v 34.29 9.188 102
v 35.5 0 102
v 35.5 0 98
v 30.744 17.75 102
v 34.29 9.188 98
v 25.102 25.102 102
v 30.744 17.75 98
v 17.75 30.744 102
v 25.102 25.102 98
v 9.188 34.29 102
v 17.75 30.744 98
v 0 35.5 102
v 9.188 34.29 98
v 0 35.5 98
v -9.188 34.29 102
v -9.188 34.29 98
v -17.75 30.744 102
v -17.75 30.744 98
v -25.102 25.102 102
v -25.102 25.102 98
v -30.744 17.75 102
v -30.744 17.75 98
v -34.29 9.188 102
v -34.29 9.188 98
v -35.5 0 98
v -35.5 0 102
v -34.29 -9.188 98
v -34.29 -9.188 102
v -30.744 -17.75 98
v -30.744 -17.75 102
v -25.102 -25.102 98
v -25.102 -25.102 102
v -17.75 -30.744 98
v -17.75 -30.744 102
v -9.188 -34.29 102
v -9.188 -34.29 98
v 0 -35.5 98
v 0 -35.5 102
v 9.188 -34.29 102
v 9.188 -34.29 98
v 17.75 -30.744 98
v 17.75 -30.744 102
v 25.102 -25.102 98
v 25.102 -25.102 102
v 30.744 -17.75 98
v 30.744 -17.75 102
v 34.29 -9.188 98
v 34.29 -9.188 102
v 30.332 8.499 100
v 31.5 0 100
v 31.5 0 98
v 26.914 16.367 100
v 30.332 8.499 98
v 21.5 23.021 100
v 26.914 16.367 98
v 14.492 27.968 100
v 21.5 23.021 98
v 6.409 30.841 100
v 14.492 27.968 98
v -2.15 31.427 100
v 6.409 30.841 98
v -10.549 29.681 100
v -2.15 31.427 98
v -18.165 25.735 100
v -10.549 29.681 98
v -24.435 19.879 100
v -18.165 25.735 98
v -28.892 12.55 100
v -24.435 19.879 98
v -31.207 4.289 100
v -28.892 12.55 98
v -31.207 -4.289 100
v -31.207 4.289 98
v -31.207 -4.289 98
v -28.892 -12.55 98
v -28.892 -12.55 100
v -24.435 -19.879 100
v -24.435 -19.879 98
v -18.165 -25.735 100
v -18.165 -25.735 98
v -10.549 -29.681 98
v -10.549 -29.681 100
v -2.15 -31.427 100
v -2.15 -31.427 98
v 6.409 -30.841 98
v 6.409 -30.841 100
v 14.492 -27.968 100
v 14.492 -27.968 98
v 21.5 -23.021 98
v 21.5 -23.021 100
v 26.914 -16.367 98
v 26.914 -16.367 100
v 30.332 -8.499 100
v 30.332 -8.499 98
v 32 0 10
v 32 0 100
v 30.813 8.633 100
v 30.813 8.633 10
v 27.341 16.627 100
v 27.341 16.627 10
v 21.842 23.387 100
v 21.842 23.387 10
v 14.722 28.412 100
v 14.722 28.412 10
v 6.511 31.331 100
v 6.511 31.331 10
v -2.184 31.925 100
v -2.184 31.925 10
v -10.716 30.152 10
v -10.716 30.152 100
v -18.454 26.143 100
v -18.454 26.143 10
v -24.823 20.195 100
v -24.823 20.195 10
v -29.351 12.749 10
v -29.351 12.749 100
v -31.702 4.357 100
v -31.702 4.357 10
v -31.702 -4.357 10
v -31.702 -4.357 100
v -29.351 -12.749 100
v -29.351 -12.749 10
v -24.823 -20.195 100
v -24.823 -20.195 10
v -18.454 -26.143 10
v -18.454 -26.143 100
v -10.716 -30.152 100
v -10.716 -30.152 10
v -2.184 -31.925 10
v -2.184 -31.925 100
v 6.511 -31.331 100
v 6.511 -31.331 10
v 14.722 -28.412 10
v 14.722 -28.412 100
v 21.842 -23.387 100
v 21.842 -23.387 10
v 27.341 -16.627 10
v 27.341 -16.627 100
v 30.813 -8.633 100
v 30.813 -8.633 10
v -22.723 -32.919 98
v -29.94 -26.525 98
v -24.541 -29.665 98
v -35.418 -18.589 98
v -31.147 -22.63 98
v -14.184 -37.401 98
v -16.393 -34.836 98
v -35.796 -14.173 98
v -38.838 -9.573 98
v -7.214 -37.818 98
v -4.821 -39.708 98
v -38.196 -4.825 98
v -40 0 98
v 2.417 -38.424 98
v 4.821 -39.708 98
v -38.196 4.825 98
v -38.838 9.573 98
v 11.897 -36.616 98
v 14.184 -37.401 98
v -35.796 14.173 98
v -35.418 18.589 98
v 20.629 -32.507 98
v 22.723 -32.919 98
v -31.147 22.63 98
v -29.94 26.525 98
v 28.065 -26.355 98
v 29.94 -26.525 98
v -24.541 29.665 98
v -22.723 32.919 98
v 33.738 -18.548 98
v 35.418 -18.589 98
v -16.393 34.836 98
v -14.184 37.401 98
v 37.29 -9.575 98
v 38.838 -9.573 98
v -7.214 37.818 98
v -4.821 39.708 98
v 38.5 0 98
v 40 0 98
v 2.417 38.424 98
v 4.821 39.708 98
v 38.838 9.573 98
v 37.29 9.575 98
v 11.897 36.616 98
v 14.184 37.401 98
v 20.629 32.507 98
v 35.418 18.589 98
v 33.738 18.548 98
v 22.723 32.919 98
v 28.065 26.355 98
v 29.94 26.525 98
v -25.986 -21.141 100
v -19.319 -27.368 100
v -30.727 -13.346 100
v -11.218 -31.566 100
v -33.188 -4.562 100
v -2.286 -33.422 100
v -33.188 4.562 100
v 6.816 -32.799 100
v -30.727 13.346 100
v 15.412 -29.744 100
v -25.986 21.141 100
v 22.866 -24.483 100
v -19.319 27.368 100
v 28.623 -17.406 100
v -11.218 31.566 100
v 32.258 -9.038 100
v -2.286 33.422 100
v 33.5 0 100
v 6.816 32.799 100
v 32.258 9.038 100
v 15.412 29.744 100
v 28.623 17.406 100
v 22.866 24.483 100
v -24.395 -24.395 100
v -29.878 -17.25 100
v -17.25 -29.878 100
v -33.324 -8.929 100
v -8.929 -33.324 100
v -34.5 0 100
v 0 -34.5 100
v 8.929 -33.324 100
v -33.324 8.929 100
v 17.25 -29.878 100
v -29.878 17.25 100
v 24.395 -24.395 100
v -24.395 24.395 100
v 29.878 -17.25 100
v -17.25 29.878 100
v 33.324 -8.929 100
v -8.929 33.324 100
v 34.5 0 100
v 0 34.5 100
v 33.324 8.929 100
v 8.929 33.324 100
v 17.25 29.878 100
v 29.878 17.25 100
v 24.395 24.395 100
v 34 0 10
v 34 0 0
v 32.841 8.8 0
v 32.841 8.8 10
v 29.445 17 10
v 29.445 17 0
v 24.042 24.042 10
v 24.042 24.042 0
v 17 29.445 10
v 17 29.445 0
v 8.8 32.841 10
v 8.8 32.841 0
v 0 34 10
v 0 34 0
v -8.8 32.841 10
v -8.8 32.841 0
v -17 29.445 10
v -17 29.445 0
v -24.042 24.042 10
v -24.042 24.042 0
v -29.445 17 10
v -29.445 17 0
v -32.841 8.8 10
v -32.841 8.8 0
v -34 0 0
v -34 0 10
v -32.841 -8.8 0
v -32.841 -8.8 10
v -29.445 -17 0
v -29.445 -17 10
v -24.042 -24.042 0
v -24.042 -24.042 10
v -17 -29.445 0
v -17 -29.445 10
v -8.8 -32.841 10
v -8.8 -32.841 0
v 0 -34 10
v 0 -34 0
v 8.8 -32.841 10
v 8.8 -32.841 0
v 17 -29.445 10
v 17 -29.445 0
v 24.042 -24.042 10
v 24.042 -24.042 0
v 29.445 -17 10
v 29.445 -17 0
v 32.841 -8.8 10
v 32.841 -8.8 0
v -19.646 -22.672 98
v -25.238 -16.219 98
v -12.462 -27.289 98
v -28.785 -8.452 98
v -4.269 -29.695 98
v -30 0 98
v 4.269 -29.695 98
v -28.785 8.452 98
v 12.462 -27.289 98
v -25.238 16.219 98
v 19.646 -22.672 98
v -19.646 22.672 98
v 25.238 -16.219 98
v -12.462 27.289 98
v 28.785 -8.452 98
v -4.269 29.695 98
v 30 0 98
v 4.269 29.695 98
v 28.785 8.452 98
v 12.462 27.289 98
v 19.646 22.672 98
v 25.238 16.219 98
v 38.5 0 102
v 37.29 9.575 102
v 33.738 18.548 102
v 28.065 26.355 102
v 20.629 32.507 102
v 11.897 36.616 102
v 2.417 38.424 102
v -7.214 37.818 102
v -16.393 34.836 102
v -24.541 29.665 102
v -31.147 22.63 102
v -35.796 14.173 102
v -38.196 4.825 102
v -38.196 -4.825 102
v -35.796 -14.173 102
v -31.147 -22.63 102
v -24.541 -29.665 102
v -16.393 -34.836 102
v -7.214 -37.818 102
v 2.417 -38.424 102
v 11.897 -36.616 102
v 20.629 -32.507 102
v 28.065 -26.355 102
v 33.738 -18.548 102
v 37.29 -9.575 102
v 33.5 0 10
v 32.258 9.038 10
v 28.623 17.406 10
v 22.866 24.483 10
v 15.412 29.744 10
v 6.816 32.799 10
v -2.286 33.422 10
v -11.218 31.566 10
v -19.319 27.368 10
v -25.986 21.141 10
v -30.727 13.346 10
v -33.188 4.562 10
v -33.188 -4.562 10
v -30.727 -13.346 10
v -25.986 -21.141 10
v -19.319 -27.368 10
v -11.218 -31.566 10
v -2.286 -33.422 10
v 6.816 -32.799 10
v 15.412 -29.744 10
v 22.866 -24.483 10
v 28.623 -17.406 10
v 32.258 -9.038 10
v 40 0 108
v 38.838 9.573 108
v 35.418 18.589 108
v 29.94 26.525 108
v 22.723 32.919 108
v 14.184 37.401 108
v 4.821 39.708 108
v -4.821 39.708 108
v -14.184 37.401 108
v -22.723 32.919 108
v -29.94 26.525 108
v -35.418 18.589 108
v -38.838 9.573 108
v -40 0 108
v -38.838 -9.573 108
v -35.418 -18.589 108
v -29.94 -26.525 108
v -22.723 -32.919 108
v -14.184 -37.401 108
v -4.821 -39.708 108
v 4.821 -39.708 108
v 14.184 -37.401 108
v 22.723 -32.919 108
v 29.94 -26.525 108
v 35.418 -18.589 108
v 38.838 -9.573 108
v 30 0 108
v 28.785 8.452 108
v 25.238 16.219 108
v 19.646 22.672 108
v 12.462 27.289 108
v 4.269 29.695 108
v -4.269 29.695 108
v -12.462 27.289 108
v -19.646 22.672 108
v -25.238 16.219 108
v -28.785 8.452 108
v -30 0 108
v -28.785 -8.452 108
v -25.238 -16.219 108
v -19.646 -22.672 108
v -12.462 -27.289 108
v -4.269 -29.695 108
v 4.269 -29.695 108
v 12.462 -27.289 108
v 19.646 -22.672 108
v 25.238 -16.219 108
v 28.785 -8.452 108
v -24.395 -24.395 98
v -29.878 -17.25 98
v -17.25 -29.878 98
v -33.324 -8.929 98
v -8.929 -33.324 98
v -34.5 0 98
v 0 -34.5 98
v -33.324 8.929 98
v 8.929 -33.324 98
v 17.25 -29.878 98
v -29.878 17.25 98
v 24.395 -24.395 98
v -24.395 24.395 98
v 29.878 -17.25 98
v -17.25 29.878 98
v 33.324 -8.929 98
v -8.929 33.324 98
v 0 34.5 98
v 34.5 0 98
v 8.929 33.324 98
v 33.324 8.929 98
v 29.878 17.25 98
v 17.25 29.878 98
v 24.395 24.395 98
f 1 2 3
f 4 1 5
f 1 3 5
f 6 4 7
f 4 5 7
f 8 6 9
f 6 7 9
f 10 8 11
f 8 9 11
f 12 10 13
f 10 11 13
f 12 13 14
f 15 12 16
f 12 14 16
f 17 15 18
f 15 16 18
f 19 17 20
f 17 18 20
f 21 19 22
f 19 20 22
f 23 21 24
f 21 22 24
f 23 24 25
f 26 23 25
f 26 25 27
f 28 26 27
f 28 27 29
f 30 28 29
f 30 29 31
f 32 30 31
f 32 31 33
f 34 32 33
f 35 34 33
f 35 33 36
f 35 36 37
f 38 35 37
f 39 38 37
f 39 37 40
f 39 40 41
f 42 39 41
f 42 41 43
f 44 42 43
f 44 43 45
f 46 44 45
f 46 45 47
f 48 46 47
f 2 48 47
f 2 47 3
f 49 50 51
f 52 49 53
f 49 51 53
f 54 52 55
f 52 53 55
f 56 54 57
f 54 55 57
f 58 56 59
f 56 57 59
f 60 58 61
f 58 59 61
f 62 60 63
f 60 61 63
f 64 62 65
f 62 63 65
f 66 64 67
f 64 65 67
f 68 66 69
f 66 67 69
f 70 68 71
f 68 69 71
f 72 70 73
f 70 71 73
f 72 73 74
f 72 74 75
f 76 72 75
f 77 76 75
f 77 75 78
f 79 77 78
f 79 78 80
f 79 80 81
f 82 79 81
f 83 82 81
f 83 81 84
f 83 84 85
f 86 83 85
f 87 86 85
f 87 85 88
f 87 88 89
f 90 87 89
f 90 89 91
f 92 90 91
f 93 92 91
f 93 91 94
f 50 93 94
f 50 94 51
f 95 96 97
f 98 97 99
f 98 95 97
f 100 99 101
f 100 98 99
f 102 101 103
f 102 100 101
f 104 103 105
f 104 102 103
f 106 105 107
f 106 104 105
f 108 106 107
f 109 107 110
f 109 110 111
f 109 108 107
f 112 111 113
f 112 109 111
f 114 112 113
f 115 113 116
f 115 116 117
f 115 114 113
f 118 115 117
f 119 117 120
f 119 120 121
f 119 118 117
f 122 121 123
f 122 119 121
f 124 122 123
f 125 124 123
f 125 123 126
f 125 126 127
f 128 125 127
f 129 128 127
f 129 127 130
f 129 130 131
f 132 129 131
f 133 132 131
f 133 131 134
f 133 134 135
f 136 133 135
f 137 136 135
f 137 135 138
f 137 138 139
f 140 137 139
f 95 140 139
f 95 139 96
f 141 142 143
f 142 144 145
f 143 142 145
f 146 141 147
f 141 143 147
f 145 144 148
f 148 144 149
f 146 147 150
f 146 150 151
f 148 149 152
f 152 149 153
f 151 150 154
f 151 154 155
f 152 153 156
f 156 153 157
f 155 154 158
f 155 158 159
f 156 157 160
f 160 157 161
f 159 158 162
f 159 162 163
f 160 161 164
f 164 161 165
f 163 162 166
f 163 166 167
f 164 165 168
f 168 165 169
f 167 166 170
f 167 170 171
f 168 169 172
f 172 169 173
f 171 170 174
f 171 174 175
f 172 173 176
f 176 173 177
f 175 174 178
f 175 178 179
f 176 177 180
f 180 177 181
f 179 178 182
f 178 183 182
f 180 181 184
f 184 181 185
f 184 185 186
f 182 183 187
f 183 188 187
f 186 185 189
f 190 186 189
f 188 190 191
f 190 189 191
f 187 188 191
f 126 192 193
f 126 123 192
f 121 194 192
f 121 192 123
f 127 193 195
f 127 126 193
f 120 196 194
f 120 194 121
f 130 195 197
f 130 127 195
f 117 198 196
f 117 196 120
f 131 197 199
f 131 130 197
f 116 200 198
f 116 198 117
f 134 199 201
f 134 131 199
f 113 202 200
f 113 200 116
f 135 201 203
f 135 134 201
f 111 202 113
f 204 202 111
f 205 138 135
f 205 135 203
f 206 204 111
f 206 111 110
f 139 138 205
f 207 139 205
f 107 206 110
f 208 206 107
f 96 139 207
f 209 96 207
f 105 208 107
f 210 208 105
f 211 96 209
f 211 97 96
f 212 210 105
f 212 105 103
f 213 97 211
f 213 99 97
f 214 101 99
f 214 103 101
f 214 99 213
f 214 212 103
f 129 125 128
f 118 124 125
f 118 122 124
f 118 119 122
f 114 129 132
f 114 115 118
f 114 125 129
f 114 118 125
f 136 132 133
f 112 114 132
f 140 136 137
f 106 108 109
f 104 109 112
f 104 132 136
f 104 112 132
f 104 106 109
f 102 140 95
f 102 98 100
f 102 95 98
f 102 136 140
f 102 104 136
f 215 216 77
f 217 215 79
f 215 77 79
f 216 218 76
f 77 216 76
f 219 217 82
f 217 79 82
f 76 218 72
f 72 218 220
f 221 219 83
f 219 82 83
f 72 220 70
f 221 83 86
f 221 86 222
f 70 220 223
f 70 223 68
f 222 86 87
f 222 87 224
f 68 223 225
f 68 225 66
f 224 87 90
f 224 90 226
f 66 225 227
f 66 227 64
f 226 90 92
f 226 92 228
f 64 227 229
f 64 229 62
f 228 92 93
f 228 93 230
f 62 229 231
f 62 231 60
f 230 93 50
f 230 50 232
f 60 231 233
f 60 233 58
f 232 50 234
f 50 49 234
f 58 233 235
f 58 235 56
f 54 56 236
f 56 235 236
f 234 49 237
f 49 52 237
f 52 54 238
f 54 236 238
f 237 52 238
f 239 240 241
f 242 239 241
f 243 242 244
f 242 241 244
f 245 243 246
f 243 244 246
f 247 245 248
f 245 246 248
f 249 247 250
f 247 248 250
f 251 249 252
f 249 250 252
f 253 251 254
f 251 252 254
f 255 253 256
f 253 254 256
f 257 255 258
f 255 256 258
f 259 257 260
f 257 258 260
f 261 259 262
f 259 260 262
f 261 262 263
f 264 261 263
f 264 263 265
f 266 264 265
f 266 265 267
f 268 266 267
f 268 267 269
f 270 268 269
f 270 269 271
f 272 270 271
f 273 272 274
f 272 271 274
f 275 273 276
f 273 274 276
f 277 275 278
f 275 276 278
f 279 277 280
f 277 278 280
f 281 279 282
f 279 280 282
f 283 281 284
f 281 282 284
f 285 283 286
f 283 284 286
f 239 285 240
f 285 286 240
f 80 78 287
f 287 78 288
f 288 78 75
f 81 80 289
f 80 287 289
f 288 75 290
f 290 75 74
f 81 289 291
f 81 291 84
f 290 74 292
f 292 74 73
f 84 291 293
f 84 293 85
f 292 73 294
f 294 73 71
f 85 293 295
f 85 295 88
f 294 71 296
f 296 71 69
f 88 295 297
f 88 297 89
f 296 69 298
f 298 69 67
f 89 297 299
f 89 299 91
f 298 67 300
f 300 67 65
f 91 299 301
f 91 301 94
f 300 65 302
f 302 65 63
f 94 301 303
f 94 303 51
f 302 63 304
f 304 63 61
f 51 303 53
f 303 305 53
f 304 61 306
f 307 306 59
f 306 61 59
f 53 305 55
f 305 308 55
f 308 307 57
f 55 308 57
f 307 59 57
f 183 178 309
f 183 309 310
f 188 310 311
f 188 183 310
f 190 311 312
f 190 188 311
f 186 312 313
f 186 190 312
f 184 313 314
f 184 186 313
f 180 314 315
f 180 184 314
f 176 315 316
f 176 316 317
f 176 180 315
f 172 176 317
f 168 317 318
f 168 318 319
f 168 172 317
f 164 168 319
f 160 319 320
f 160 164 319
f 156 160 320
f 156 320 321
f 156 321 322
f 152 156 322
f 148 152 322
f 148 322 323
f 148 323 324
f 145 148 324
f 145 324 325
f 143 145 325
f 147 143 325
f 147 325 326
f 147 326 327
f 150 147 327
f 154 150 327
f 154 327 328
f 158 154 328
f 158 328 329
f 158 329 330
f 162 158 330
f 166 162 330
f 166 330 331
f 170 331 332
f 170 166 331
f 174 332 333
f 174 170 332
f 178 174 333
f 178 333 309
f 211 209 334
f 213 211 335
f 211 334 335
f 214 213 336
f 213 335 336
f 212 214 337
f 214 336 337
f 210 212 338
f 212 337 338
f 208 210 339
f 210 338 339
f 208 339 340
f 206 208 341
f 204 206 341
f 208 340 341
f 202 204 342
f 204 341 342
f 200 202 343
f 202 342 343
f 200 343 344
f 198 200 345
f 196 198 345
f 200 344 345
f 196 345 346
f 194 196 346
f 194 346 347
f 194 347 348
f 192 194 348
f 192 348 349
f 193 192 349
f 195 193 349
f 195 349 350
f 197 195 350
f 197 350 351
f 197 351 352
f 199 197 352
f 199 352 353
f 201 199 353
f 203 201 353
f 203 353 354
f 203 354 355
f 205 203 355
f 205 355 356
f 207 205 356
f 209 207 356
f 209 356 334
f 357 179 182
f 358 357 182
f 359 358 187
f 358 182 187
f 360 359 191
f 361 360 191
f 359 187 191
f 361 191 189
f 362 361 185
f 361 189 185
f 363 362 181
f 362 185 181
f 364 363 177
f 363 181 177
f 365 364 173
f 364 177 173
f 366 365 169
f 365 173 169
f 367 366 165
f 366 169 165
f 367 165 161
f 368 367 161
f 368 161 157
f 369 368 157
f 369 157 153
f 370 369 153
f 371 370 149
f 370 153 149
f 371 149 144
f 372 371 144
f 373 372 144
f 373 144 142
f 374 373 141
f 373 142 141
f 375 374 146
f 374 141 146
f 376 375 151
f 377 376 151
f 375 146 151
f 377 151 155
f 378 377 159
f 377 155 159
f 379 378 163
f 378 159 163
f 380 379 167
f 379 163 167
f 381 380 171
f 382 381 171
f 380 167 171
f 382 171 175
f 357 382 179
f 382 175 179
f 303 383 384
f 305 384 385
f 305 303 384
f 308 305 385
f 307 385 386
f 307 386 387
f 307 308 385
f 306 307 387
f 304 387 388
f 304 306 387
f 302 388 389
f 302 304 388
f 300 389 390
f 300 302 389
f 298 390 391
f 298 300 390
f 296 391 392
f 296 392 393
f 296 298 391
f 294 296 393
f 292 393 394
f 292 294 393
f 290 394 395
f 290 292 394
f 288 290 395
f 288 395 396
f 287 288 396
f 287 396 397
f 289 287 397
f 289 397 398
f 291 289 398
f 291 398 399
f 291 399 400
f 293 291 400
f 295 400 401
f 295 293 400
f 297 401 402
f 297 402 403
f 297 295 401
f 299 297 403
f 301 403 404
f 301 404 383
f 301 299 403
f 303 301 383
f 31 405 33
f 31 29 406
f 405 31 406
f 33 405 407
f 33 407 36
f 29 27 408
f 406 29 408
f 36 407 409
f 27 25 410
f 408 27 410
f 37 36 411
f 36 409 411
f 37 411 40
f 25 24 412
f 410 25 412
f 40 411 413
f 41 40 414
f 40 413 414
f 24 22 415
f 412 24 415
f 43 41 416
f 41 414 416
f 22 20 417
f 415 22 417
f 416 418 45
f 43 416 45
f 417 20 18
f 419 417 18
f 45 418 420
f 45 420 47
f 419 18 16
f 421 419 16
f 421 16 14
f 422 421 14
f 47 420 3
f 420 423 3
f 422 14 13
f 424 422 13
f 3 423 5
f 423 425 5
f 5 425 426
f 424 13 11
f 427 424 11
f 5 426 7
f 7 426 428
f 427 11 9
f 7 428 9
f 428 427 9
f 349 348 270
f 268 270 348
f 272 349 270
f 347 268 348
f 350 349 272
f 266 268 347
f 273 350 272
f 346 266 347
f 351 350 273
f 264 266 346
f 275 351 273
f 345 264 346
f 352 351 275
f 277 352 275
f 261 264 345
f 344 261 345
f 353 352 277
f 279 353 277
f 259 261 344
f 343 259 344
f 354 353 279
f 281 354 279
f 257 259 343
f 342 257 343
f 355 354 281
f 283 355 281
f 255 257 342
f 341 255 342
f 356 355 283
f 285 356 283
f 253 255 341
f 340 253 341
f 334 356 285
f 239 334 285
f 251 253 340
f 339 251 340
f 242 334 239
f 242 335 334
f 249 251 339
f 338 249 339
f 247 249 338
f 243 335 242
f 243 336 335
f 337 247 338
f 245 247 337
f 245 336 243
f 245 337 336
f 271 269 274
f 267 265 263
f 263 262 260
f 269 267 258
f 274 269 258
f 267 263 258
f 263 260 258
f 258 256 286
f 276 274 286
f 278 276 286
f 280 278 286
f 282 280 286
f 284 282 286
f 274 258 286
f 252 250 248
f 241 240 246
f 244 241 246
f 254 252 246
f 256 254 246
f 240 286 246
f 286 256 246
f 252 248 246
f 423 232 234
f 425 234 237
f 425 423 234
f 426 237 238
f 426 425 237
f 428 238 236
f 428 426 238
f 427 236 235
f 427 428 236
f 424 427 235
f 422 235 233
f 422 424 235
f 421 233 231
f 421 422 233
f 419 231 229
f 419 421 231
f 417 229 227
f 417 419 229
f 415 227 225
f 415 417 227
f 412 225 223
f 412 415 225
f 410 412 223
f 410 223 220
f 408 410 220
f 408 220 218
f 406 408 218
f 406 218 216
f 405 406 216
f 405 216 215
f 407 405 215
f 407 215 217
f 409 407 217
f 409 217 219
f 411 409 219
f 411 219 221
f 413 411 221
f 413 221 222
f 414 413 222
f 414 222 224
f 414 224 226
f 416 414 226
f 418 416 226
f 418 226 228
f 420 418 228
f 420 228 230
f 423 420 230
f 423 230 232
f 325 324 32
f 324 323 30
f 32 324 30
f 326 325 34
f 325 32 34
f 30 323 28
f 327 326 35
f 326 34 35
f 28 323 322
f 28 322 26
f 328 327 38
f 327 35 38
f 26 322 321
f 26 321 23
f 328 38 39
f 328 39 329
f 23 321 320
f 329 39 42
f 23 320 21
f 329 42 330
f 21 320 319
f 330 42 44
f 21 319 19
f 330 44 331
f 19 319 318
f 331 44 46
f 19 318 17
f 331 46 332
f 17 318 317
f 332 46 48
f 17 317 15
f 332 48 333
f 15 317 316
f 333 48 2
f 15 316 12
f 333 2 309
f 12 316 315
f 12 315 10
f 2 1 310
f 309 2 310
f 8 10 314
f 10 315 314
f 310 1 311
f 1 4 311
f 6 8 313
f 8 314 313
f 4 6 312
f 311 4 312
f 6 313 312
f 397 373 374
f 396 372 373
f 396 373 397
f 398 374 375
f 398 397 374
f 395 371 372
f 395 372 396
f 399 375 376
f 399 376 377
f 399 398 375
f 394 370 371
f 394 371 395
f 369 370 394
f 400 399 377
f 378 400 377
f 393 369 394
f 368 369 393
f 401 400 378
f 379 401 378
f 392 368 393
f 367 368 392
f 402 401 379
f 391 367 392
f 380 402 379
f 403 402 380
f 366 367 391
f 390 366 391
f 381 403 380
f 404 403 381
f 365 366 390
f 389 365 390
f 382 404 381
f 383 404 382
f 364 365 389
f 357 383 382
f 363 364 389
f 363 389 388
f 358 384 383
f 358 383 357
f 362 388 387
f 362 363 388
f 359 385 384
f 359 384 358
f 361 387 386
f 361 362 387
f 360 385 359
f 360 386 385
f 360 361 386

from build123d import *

# Parameters (mm, degrees)
CYLINDER_R     = 34
CYLINDER_DEPTH = 10
TUBE_R         = 33.5
TUBE_R_2       = 32
TUBE_DEPTH     = 100
TUBE003_R      = 38.5
TUBE003_R_2    = 35.5
TUBE003_DEPTH  = 10
TUBE002_R      = 34.5
TUBE002_R_2    = 31.5
TUBE002_DEPTH  = 100
TUBE001_R      = 40
TUBE001_R_2    = 30
TUBE001_DEPTH  = 10


with BuildPart() as cilindro:
    # Cylinder → Cylinder (new body)
    with BuildSketch(Plane.XY):
        Circle(CYLINDER_R)
    extrude(amount=CYLINDER_DEPTH)


with BuildPart() as basura_34mmr:
    # Tube → Tube (new body)
    with BuildSketch(Plane.XY):
        Circle(TUBE_R)
        Circle(TUBE_R_2, mode=Mode.SUBTRACT)
    extrude(amount=TUBE_DEPTH)

    # Fusion: union Cilindro
    add(cilindro.part)


with BuildPart() as tube003:
    # Tube003 → Tube003 (new body)
    with BuildSketch(Plane.XY.offset(92)):
        Circle(TUBE003_R)
        Circle(TUBE003_R_2, mode=Mode.SUBTRACT)
    extrude(amount=TUBE003_DEPTH)


with BuildPart() as tube002:
    # Tube002 → Tube002 (new body)
    with BuildSketch(Plane.XY):
        Circle(TUBE002_R)
        Circle(TUBE002_R_2, mode=Mode.SUBTRACT)
    extrude(amount=TUBE002_DEPTH)


with BuildPart() as cut001:
    # Tube001 → Tube001 (new body)
    with BuildSketch(Plane.XY.offset(98)):
        Circle(TUBE001_R)
        Circle(TUBE001_R_2, mode=Mode.SUBTRACT)
    extrude(amount=TUBE001_DEPTH)

    # Cut: cut Tube002
    add(tube002.part, mode=Mode.SUBTRACT)

    # Cut001: cut Tube003
    add(tube003.part, mode=Mode.SUBTRACT)


solid = Compound([basura_34mmr.part, cut001.part])
